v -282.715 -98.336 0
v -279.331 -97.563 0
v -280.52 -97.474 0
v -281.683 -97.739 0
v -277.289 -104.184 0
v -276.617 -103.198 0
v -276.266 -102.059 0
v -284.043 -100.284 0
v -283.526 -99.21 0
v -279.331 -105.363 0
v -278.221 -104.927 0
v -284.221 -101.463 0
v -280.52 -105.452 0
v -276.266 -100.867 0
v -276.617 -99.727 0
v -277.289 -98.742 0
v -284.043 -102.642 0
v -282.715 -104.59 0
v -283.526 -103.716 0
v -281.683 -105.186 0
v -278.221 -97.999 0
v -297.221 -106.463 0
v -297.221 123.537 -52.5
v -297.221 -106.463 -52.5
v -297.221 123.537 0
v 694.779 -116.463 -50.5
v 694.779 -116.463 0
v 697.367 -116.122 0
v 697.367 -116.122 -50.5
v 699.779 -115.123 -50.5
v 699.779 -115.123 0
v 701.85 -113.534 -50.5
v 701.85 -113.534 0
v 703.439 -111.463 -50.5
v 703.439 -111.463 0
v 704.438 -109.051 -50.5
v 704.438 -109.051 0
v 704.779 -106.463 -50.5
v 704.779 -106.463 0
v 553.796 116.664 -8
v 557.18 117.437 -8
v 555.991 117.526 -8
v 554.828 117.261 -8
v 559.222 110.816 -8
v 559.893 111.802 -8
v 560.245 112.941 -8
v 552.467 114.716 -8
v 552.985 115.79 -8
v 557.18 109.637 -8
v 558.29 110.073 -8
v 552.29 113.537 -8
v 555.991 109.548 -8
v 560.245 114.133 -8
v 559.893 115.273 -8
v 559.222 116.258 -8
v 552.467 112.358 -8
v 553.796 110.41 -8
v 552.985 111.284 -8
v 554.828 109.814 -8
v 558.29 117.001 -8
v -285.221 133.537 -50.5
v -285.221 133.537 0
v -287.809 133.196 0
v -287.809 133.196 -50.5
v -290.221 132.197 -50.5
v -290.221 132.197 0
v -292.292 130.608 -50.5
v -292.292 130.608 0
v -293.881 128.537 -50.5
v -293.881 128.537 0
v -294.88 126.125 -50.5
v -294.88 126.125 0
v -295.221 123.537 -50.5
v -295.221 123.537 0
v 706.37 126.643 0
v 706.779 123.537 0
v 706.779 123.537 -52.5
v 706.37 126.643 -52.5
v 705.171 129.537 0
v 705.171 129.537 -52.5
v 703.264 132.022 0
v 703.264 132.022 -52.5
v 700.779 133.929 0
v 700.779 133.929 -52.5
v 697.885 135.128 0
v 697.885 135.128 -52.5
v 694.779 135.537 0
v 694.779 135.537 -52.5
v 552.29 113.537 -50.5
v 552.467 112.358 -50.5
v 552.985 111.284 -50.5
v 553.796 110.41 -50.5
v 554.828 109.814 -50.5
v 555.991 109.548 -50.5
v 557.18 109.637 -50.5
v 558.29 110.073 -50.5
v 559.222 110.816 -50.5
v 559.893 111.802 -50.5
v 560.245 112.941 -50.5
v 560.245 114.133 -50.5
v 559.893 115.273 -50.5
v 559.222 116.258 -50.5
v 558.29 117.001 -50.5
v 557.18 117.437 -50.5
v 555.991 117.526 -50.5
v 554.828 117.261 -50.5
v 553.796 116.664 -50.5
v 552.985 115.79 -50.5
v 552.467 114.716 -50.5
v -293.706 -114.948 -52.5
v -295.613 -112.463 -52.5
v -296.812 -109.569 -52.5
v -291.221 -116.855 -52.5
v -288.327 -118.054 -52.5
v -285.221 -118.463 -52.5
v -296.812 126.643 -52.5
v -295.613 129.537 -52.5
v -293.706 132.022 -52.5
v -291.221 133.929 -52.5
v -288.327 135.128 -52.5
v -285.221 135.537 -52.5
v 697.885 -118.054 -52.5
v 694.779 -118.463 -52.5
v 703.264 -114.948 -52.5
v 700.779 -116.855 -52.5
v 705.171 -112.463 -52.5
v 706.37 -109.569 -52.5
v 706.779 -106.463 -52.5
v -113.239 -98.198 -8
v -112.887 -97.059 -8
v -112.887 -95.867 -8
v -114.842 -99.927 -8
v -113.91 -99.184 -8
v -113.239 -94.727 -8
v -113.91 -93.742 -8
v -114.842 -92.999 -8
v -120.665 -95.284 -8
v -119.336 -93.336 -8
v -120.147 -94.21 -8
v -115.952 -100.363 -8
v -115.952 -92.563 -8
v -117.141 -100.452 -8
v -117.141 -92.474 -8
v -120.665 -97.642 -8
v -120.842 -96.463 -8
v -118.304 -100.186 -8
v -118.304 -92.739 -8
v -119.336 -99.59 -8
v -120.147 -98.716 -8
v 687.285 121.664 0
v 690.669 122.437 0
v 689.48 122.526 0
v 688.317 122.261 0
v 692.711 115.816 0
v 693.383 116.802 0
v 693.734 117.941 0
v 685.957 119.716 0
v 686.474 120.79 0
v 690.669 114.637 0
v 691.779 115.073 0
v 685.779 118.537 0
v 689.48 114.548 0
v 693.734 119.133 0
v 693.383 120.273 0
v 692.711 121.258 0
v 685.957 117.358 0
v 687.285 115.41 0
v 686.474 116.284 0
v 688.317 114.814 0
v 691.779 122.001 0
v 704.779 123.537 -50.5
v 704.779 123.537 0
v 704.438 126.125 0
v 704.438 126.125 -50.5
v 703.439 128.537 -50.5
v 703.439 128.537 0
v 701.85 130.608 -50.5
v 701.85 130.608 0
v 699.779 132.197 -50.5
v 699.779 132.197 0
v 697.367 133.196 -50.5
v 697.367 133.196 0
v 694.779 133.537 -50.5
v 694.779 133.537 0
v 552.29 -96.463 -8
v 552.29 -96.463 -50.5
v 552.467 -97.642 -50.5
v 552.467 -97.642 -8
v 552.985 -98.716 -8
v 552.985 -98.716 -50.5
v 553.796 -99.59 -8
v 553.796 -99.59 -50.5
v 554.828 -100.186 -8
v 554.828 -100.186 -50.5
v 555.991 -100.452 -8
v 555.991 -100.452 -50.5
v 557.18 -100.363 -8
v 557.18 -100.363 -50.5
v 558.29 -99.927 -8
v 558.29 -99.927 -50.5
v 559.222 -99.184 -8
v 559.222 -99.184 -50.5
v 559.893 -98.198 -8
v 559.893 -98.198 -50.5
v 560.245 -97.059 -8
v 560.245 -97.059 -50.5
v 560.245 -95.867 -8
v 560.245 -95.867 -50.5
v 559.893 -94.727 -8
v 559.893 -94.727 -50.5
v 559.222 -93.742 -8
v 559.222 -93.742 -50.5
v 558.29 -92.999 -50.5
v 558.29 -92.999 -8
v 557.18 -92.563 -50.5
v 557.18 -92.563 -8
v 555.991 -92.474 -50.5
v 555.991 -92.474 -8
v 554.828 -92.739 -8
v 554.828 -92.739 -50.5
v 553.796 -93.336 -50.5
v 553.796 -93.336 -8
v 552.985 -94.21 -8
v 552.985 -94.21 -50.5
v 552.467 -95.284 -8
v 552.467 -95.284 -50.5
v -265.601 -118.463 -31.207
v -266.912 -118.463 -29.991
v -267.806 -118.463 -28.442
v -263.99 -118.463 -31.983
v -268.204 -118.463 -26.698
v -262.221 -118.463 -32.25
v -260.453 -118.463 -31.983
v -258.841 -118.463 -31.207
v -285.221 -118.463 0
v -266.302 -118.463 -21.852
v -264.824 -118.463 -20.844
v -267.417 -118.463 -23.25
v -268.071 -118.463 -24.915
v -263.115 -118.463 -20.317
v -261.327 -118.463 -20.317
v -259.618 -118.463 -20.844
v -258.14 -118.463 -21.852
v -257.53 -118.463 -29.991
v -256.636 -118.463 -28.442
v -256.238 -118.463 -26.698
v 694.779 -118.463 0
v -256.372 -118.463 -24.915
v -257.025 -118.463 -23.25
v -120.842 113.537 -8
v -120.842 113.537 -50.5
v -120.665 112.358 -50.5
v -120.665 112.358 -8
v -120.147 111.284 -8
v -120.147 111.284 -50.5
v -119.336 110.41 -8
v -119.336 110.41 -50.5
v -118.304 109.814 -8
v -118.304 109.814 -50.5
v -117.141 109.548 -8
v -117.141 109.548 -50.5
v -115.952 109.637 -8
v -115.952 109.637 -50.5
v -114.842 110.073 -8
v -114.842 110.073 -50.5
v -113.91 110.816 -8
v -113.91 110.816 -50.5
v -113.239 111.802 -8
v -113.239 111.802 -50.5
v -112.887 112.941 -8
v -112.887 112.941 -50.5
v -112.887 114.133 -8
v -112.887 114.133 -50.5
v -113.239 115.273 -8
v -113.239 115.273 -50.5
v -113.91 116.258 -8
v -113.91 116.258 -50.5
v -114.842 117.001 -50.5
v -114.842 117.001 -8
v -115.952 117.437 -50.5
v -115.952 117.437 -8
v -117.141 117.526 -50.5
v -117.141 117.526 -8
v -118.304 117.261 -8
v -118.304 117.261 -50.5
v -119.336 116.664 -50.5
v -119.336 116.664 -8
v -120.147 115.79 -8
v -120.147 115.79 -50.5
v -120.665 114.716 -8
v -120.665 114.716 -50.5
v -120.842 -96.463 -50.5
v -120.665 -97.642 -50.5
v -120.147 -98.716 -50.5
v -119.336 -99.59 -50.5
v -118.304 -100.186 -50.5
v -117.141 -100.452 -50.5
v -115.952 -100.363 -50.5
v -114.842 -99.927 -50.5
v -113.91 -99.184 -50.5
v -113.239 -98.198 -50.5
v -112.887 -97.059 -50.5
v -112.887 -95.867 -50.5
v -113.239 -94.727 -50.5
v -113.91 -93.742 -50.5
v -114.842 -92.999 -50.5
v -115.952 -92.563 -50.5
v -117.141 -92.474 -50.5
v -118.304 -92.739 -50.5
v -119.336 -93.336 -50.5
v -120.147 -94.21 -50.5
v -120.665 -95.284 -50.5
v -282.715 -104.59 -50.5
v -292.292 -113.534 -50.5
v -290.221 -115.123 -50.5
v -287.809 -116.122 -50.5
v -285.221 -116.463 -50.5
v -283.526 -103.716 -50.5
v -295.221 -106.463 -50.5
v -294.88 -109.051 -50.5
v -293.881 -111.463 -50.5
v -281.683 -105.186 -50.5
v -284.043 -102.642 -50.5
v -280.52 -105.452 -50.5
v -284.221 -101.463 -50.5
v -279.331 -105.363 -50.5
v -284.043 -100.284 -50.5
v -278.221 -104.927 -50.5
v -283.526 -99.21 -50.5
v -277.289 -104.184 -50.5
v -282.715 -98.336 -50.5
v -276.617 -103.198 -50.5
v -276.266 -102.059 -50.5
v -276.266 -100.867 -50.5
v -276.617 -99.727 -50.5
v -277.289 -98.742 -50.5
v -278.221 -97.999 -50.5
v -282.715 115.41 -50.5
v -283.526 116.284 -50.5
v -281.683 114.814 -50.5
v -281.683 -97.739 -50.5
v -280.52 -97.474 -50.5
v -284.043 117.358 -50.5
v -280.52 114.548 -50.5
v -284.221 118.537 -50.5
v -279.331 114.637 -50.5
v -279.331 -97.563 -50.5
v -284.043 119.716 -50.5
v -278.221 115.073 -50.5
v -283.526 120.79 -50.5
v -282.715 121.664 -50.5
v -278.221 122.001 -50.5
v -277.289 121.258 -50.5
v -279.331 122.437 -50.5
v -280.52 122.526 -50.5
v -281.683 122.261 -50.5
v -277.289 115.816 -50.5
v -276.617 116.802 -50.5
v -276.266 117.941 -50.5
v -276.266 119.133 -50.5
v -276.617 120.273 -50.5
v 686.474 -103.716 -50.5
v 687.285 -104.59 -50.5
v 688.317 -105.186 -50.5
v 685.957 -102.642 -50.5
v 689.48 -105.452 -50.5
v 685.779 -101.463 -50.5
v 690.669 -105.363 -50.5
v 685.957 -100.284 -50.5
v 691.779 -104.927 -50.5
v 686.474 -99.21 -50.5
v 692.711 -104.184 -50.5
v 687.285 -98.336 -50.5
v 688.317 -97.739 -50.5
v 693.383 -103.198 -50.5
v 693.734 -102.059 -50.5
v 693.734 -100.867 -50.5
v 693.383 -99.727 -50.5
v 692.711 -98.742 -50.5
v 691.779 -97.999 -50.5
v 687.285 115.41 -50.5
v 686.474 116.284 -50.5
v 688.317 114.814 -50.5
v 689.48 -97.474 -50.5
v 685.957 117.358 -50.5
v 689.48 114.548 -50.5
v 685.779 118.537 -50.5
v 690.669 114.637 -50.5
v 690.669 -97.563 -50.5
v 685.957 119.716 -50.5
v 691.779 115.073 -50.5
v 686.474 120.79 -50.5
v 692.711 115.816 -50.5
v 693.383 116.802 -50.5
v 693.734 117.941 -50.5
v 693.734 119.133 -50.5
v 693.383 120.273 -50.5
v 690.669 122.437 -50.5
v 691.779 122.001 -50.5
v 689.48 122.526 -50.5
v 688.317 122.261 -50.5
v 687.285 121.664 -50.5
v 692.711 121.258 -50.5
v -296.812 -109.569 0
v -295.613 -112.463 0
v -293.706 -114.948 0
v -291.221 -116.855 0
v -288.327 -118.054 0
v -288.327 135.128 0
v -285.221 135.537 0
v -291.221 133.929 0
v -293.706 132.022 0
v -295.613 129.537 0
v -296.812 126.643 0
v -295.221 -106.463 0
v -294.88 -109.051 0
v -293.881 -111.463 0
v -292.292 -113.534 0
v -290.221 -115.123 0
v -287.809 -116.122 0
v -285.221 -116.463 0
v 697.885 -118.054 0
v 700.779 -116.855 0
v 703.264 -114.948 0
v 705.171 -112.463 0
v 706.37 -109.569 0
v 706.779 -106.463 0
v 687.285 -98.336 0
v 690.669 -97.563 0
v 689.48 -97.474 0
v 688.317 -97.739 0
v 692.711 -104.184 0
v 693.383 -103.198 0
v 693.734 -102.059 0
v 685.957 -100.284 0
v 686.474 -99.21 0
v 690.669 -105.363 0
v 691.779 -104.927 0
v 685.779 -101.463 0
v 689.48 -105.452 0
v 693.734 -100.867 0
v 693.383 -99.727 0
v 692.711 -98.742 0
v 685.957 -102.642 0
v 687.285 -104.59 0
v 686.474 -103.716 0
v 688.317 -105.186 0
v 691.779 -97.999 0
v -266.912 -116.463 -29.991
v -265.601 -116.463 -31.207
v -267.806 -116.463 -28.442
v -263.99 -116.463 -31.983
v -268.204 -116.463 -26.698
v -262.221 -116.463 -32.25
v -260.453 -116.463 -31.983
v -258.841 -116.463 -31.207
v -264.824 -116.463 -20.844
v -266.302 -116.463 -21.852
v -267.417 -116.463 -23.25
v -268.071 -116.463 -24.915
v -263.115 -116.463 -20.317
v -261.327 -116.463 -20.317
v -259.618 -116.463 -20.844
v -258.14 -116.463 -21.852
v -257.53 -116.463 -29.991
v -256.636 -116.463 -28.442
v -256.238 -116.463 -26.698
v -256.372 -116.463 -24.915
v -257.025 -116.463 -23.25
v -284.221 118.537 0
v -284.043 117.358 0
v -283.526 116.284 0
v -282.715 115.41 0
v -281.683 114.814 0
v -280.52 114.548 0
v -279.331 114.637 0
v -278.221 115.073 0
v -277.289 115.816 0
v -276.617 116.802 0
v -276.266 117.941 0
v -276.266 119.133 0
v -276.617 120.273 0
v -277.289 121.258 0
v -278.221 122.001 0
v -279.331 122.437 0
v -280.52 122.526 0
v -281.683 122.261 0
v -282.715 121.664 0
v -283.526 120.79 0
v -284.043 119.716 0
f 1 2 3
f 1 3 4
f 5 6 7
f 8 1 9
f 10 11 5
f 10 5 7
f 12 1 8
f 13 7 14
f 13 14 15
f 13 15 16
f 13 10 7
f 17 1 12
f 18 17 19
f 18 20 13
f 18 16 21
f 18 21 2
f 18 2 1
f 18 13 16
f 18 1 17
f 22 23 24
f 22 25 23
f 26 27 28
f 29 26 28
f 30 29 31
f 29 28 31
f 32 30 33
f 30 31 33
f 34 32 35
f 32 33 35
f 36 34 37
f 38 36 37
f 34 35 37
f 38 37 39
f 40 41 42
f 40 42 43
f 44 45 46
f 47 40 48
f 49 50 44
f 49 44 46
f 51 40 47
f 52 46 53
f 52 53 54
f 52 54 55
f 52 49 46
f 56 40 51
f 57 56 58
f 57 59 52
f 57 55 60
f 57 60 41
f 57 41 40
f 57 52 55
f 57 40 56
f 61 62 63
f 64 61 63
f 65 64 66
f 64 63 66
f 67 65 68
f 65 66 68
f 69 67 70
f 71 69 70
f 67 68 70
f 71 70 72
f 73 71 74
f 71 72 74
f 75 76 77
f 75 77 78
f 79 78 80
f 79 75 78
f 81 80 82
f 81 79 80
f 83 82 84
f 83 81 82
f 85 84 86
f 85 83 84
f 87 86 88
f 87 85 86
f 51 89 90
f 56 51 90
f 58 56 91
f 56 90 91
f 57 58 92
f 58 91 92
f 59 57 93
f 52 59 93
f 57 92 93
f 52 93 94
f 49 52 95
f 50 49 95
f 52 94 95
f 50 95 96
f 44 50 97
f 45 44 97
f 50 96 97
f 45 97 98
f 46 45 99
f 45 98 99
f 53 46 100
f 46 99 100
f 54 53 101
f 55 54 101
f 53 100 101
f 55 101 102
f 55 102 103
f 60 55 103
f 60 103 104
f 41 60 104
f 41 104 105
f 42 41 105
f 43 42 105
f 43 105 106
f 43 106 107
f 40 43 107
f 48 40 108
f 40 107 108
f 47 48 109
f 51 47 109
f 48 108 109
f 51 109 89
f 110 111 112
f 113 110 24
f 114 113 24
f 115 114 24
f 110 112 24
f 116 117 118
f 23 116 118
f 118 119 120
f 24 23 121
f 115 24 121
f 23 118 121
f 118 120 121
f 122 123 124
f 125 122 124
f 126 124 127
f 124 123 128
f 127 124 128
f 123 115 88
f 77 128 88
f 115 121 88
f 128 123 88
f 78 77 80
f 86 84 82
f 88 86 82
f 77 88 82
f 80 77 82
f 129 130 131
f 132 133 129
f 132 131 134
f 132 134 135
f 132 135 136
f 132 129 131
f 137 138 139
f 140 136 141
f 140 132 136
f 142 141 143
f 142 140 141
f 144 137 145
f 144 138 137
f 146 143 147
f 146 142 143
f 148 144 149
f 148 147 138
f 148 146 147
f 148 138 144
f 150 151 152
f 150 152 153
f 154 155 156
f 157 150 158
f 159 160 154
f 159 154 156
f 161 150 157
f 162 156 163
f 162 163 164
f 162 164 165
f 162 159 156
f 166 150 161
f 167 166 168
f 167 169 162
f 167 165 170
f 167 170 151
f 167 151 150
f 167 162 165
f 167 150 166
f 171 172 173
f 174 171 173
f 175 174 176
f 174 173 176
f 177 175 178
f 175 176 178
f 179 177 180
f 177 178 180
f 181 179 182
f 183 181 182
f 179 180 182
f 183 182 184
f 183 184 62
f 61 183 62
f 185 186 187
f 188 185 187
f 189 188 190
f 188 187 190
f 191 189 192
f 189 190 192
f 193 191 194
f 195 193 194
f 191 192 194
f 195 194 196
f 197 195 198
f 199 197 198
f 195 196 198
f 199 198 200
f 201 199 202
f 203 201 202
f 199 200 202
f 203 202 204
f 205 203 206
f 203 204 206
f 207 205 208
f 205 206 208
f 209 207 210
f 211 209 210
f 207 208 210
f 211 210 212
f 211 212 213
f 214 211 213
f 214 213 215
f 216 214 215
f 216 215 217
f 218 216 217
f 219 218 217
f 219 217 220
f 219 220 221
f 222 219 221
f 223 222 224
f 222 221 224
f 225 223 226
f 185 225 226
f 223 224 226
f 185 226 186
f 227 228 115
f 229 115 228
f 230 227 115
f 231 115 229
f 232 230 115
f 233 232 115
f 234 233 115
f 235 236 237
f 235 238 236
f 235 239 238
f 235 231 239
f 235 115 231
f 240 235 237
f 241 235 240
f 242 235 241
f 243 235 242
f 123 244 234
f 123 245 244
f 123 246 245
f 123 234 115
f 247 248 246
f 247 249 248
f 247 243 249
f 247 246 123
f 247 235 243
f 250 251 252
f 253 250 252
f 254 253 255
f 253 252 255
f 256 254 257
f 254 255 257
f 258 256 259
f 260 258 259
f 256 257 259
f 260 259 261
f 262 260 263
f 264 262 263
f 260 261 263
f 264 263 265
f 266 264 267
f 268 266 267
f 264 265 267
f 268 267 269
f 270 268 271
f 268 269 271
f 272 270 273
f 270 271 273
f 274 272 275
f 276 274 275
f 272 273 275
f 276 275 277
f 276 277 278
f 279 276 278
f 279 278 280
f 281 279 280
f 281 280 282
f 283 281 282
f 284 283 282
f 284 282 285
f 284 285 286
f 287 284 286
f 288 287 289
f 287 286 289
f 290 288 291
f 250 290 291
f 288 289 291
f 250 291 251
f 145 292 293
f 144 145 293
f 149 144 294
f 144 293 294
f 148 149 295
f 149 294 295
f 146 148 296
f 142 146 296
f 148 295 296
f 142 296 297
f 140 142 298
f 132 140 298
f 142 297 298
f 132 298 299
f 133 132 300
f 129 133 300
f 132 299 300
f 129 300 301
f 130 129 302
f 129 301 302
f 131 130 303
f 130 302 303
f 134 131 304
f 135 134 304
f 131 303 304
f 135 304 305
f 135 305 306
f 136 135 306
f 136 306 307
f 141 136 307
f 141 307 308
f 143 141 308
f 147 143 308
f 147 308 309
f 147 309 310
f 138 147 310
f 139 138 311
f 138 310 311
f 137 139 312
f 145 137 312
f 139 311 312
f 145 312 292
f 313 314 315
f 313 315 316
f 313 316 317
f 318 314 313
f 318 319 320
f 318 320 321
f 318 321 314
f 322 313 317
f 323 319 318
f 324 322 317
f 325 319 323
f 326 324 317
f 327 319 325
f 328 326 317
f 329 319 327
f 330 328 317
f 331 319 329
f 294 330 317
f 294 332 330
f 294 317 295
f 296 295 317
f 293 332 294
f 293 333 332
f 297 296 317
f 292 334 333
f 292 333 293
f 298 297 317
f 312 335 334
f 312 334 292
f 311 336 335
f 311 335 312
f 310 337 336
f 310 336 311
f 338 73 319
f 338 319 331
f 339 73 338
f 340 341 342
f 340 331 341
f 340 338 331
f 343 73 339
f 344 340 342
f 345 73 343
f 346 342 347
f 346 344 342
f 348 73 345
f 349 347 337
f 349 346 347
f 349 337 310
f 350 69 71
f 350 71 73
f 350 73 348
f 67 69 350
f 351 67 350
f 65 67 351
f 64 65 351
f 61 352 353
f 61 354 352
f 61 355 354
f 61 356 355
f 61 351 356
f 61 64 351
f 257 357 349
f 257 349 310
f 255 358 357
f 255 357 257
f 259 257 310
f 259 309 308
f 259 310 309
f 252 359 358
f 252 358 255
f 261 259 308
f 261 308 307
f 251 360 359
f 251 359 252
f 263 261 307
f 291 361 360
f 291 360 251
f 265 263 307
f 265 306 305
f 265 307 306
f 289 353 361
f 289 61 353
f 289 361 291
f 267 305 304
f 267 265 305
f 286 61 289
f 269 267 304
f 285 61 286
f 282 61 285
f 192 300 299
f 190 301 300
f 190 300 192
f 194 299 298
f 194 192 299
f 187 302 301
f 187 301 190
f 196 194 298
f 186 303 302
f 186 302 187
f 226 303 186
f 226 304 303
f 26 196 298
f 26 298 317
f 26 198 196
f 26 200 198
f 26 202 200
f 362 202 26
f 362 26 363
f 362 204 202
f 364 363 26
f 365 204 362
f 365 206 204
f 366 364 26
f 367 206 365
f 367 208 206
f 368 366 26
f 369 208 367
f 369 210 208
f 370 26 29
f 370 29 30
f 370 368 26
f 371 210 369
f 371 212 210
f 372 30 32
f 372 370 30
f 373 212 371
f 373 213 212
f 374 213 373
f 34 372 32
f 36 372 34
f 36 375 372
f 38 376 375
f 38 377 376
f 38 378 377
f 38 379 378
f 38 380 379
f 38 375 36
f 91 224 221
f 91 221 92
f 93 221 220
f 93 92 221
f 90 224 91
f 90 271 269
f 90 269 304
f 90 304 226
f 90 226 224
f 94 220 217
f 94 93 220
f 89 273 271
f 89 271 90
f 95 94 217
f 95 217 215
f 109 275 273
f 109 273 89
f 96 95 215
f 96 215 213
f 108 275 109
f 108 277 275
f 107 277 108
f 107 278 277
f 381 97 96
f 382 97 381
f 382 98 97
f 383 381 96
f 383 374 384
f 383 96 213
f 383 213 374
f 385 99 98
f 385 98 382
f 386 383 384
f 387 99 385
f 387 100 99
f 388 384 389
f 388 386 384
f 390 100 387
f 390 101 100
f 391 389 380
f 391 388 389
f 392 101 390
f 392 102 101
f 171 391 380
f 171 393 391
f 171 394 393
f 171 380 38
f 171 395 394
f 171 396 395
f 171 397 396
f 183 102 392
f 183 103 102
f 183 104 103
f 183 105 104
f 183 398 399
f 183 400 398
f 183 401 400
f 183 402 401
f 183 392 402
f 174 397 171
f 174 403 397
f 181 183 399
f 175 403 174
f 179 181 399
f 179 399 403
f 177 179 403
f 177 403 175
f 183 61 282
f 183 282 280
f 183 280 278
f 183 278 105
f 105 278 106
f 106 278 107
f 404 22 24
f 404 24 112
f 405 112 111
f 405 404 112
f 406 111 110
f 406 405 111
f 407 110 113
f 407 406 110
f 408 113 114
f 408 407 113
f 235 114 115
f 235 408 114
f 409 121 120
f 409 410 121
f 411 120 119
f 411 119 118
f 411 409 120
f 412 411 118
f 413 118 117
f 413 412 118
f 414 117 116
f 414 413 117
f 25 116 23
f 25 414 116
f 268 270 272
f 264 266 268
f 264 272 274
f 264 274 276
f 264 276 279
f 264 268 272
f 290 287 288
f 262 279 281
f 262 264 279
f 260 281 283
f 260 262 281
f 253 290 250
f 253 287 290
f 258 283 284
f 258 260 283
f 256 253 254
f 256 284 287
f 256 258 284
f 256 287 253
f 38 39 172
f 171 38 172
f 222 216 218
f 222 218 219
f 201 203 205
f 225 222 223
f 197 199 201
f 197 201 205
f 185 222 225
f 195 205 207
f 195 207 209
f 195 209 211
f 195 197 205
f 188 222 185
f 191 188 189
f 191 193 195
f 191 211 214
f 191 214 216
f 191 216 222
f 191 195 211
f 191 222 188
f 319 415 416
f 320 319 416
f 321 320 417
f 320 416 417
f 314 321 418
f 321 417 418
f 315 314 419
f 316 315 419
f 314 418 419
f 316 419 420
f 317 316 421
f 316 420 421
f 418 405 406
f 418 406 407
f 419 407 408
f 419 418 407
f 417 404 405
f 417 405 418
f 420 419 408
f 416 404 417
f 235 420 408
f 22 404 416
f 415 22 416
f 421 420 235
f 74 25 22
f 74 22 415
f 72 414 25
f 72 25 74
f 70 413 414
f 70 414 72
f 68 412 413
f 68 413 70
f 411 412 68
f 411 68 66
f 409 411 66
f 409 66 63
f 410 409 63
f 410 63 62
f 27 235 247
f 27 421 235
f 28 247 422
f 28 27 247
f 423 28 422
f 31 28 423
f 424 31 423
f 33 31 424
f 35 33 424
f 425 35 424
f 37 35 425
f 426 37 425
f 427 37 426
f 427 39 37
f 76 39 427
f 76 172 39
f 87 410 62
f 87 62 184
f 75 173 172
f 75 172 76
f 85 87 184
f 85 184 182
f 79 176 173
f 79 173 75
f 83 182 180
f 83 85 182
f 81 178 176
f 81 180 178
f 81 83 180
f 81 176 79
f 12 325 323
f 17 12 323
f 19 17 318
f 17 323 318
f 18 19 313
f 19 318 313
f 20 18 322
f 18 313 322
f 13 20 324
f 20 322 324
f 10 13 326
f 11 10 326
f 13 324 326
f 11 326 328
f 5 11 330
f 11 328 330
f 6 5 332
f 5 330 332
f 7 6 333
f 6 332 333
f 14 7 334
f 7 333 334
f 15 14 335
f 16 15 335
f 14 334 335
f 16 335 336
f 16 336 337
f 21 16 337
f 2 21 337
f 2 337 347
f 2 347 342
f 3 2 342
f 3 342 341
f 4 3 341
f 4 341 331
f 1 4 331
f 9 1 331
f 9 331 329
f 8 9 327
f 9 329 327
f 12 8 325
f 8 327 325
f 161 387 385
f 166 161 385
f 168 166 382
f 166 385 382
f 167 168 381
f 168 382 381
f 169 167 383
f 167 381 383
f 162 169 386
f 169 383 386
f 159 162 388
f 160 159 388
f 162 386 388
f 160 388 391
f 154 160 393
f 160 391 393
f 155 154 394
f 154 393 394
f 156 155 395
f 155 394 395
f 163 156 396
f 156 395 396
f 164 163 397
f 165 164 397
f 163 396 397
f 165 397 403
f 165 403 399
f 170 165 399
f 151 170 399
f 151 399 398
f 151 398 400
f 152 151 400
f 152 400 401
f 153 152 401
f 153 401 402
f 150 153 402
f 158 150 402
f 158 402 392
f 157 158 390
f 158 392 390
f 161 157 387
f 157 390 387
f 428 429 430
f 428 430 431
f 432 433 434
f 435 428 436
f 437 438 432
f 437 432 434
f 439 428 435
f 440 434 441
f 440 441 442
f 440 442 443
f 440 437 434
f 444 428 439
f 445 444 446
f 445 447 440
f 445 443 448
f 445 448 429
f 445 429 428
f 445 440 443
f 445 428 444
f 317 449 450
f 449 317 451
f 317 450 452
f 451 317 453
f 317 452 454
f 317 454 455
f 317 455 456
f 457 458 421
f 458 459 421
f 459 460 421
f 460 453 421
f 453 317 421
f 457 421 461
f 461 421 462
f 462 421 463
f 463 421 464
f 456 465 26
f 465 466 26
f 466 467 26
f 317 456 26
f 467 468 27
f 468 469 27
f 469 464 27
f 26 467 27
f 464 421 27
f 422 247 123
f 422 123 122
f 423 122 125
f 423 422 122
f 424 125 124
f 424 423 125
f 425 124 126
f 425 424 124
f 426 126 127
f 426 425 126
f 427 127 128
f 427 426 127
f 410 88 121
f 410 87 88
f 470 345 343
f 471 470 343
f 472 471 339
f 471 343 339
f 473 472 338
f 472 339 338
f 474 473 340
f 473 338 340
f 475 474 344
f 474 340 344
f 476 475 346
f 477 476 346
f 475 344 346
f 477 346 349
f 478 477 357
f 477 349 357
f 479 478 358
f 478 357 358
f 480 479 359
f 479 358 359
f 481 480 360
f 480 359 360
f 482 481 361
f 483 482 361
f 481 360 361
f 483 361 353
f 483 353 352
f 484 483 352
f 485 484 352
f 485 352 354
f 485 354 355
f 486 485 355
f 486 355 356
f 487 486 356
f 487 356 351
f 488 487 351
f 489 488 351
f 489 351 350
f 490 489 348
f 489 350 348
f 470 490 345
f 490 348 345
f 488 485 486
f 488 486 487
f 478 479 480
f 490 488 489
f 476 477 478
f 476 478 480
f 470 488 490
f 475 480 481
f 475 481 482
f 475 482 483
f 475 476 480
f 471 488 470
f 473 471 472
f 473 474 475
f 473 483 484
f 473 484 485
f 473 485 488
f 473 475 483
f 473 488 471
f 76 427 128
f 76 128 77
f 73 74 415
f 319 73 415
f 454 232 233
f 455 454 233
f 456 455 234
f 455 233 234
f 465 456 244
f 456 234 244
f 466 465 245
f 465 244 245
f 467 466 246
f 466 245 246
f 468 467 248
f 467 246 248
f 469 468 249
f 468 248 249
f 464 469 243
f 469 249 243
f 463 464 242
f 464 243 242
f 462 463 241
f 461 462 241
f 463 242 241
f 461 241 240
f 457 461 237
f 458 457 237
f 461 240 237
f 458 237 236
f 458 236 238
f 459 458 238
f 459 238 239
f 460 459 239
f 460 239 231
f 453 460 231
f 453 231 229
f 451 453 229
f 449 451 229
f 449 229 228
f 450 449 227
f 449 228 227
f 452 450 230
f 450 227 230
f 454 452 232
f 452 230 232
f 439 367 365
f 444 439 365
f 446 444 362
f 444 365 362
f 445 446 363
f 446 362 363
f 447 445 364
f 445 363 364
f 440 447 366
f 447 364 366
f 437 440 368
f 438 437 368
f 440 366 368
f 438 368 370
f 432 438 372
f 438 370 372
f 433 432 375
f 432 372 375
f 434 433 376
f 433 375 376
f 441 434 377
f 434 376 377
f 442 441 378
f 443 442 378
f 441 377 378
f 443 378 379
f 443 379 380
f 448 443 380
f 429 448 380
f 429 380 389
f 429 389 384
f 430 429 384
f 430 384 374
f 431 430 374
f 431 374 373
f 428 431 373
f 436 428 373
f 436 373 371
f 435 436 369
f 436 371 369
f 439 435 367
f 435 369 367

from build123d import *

# Parameters (mm, degrees)
BOSS_EXTRU_1_DEPTH      = 50.5
BOSS_EXTRU_2_DEPTH      = 2
ESQUISSE6_R             = 4
BOSS_EXTRU_4_DEPTH      = 50.5
ESQUISSE7_R             = 4
BOSS_EXTRU_5_DEPTH      = 42.5
ESQUISSE8_R             = 6
ENL_V_MAT_EXTRU_1_DEPTH = 2


with BuildPart() as part:
    # Esquisse2 → Boss.-Extru.1 (new body)
    with BuildSketch(Plane.XY):
        with BuildLine():
            Line((694.77885805, 135.537159381), (-285.22114195, 135.537159381))
            ThreePointArc((-285.22114195, 135.537159381), (-293.706423325, 132.022440755), (-297.22114195, 123.537159381))
            Line((-297.22114195, 123.537159381), (-297.22114195, -106.462840619))
            ThreePointArc((-297.22114195, -106.462840619), (-293.706423325, -114.948121993), (-285.22114195, -118.462840619))
            Line((-285.22114195, -118.462840619), (694.77885805, -118.462840619))
            ThreePointArc((694.77885805, -118.462840619), (703.264139424, -114.948121993), (706.77885805, -106.462840619))
            Line((706.77885805, -106.462840619), (706.77885805, 123.537159381))
            ThreePointArc((706.77885805, 123.537159381), (703.264139424, 132.022440755), (694.77885805, 135.537159381))
        make_face()
        with BuildLine():
            Line((-295.22114195, 123.537159381), (-295.22114195, -106.462840619))
            ThreePointArc((-295.22114195, -106.462840619), (-292.292209762, -113.533908431), (-285.22114195, -116.462840619))
            Line((-285.22114195, -116.462840619), (694.77885805, -116.462840619))
            ThreePointArc((694.77885805, -116.462840619), (701.849925862, -113.533908431), (704.77885805, -106.462840619))
            Line((704.77885805, -106.462840619), (704.77885805, 123.537159381))
            ThreePointArc((704.77885805, 123.537159381), (701.849925862, 130.608227193), (694.77885805, 133.537159381))
            Line((694.77885805, 133.537159381), (-285.22114195, 133.537159381))
            ThreePointArc((-285.22114195, 133.537159381), (-292.292209762, 130.608227193), (-295.22114195, 123.537159381))
        make_face(mode=Mode.SUBTRACT)
    extrude(amount=-BOSS_EXTRU_1_DEPTH)

    # Esquisse4 → Boss.-Extru.2 (add)
    with BuildSketch(Plane(origin=(0, 0, -50.5), x_dir=(-1, 0, 0), z_dir=(0, 0, -1))):
        with BuildLine():
            Line((297.22114195, 123.537159381), (297.22114195, -106.462840619))
            ThreePointArc((297.22114195, -106.462840619), (293.706423325, -114.948121993), (285.22114195, -118.462840619))
            Line((285.22114195, -118.462840619), (-694.77885805, -118.462840619))
            ThreePointArc((-694.77885805, -118.462840619), (-703.264139424, -114.948121993), (-706.77885805, -106.462840619))
            Line((-706.77885805, -106.462840619), (-706.77885805, 123.537159381))
            ThreePointArc((-706.77885805, 123.537159381), (-703.264139424, 132.022440755), (-694.77885805, 135.537159381))
            Line((-694.77885805, 135.537159381), (285.22114195, 135.537159381))
            ThreePointArc((285.22114195, 135.537159381), (293.706423325, 132.022440755), (297.22114195, 123.537159381))
        make_face()
    extrude(amount=BOSS_EXTRU_2_DEPTH)

    # Esquisse6 → Boss.-Extru.4 (add)
    with BuildSketch(Plane.XY.offset(-50.5)):
        with Locations(Location((-280.22114195, 118.537159381, 0), (0, 0, 180))):
            Circle(ESQUISSE6_R)
        with Locations(Location((-280.22114195, -101.462840619, 0), (0, 0, 180))):
            Circle(ESQUISSE6_R)
        with Locations(Location((689.77885805, -101.462840619, 0), (0, 0, 180))):
            Circle(ESQUISSE6_R)
        with Locations(Location((689.77885805, 118.537159381, 0), (0, 0, 180))):
            Circle(ESQUISSE6_R)
    extrude(amount=BOSS_EXTRU_4_DEPTH)

    # Esquisse7 → Boss.-Extru.5 (add)
    with BuildSketch(Plane.XY.offset(-50.5)):
        with Locations(Location((-116.842462294, 113.537159381, 0), (0, 0, 180))):
            Circle(ESQUISSE7_R)
        with Locations(Location((-116.842462294, -96.462840619, 0), (0, 0, 180))):
            Circle(ESQUISSE7_R)
        with Locations(Location((556.289518221, 113.537159381, 0), (0, 0, 180))):
            Circle(ESQUISSE7_R)
        with Locations(Location((556.289518221, -96.462840619, 0), (0, 0, 180))):
            Circle(ESQUISSE7_R)
    extrude(amount=BOSS_EXTRU_5_DEPTH)

    # Esquisse8 → Enlèv. mat.-Extru.1 (cut)
    with BuildSketch(Plane(origin=(0, -118.462840619, 0), x_dir=(-1, 0, 0), z_dir=(0, -1, 0))):
        with Locations(Location((262.22114195, 26.25, 0), (0, 0, 90))):
            Circle(ESQUISSE8_R)
    extrude(amount=-ENL_V_MAT_EXTRU_1_DEPTH, mode=Mode.SUBTRACT)


solid = part.part
